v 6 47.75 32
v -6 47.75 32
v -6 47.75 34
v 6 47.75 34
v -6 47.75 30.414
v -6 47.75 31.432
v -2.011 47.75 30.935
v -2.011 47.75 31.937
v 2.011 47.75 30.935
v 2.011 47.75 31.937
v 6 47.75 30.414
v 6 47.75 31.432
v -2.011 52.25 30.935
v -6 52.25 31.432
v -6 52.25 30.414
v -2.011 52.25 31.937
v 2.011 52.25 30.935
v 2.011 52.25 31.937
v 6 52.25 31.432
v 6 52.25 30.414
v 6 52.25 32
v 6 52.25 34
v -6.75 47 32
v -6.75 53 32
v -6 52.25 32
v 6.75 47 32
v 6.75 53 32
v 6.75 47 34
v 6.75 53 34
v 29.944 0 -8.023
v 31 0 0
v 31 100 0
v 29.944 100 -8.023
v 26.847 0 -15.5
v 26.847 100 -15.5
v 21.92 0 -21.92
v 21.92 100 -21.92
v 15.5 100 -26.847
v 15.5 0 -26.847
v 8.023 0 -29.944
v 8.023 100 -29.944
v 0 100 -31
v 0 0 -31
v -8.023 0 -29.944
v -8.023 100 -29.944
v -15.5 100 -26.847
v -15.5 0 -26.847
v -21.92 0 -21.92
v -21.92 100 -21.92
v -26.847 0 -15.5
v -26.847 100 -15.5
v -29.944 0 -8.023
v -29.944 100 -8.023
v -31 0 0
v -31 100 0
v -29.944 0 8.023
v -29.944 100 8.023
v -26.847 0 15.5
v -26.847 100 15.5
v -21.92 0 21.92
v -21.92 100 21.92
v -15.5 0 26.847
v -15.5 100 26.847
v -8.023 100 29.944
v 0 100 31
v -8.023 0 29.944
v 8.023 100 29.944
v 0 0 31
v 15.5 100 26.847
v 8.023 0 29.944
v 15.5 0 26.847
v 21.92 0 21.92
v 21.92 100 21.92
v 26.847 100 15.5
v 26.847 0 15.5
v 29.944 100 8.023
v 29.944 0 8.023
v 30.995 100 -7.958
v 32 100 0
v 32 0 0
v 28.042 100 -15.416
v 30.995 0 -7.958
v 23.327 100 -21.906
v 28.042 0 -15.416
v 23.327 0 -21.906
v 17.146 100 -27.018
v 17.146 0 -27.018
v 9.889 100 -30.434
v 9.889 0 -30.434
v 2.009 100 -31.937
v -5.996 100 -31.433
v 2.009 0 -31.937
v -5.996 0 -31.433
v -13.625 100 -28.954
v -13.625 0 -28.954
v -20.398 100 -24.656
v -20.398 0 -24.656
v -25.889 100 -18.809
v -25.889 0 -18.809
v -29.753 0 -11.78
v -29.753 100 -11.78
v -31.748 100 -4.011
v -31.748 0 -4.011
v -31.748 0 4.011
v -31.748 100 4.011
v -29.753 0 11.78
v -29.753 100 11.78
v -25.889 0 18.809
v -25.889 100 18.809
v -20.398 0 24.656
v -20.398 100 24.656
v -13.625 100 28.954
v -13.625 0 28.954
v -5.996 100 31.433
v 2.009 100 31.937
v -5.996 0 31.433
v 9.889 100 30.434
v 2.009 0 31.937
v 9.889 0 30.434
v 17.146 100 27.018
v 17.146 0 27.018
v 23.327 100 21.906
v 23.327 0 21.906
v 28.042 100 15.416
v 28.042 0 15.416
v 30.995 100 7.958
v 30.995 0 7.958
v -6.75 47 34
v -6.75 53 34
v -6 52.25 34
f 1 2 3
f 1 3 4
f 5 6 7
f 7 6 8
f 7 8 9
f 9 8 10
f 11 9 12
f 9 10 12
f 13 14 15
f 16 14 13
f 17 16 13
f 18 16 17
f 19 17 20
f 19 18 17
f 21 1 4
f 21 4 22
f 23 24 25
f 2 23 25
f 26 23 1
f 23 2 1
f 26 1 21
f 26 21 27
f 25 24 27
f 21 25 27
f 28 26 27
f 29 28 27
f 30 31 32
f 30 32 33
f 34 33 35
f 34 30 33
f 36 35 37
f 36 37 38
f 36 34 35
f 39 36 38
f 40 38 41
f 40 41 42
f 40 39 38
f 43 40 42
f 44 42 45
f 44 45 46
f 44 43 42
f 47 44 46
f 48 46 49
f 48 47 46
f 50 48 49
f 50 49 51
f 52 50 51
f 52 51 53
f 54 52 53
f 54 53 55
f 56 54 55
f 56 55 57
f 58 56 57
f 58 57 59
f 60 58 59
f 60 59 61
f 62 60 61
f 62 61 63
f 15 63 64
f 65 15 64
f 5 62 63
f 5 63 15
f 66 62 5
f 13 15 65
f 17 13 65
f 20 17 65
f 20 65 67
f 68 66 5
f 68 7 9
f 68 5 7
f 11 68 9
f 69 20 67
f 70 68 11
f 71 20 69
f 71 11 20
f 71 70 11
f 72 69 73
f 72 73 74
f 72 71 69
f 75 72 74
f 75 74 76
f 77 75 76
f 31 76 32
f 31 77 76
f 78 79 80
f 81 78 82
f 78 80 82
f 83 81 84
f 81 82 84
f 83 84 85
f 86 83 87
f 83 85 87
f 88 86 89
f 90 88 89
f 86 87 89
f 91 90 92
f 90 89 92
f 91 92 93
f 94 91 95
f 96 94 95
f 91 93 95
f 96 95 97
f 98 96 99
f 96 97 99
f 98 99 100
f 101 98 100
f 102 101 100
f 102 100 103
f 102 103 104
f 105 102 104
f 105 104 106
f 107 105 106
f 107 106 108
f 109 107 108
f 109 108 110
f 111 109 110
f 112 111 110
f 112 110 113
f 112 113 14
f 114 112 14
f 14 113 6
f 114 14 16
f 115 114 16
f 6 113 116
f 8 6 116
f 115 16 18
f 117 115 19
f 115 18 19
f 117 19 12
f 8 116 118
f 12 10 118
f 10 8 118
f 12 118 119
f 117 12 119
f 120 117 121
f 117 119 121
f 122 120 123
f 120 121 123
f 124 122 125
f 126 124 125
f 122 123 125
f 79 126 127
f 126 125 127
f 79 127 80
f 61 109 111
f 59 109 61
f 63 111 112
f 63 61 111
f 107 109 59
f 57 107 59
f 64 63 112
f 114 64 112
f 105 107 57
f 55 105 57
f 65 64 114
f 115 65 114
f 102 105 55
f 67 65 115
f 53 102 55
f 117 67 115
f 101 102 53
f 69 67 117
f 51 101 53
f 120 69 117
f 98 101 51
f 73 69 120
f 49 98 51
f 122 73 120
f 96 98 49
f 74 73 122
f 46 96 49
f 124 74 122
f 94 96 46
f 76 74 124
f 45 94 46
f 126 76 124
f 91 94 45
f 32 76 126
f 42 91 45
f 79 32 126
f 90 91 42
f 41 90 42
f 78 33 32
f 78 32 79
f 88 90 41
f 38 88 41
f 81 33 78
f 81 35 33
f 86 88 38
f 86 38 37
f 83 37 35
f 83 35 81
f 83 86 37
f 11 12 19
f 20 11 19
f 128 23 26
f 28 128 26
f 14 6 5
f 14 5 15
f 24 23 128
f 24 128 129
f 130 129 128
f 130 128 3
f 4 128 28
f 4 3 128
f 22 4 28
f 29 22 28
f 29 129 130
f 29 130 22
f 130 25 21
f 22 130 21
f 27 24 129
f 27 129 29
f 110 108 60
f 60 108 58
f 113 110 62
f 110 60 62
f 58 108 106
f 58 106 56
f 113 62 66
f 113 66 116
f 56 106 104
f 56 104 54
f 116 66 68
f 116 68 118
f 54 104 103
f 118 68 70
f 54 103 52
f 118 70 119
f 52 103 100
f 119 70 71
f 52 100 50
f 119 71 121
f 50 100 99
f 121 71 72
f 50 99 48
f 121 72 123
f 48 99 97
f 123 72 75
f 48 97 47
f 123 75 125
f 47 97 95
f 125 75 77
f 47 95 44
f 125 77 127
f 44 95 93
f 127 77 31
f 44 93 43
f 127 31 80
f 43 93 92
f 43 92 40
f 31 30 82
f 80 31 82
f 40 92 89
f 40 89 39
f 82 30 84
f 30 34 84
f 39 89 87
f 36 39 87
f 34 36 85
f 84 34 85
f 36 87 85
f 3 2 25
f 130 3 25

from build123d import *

# Parameters (mm, degrees)
SKETCH1_R               = 32
SKETCH1_R_2             = 31
BOSS_EXTRUDE1_DEPTH     = 100
SKETCH2_W               = 13.5
SKETCH2_H               = 6
SKETCH2_W_2             = 12
SKETCH2_H_2             = 4.5
BOSS_EXTRUDE2_DEPTH     = 2
SKETCH4_W               = 12
SKETCH4_H               = 4.5
CUT_EXTRUDE1_DEPTH      = 3
CUT_EXTRUDE1_DEPTH_BACK = 15


with BuildPart() as part:
    # Sketch1 → Boss-Extrude1 (new body)
    with BuildSketch(Plane(origin=(0, 0, 0), x_dir=(1, 0, 0), z_dir=(0, 1, 0))):
        Circle(SKETCH1_R)
        Circle(SKETCH1_R_2, mode=Mode.SUBTRACT)
    extrude(amount=BOSS_EXTRUDE1_DEPTH)

    # Sketch4 → Cut-Extrude1 (cut, two sides)
    with BuildSketch(Plane.XY.offset(32)) as cut_extrude1_sk:
        with Locations((0, 50)):
            Rectangle(SKETCH4_W, SKETCH4_H)
    extrude(amount=CUT_EXTRUDE1_DEPTH, mode=Mode.SUBTRACT)
    extrude(cut_extrude1_sk.sketch, amount=-CUT_EXTRUDE1_DEPTH_BACK, mode=Mode.SUBTRACT)


with BuildPart() as body_2:
    # Sketch2 → Boss-Extrude2 (new body)
    with BuildSketch(Plane.XY.offset(32)):
        with Locations((0, 50)):
            Rectangle(SKETCH2_W, SKETCH2_H)
        with Locations((0, 50)):
            Rectangle(SKETCH2_W_2, SKETCH2_H_2, mode=Mode.SUBTRACT)
    extrude(amount=BOSS_EXTRUDE2_DEPTH)


solid = Compound([part.part, body_2.part])
